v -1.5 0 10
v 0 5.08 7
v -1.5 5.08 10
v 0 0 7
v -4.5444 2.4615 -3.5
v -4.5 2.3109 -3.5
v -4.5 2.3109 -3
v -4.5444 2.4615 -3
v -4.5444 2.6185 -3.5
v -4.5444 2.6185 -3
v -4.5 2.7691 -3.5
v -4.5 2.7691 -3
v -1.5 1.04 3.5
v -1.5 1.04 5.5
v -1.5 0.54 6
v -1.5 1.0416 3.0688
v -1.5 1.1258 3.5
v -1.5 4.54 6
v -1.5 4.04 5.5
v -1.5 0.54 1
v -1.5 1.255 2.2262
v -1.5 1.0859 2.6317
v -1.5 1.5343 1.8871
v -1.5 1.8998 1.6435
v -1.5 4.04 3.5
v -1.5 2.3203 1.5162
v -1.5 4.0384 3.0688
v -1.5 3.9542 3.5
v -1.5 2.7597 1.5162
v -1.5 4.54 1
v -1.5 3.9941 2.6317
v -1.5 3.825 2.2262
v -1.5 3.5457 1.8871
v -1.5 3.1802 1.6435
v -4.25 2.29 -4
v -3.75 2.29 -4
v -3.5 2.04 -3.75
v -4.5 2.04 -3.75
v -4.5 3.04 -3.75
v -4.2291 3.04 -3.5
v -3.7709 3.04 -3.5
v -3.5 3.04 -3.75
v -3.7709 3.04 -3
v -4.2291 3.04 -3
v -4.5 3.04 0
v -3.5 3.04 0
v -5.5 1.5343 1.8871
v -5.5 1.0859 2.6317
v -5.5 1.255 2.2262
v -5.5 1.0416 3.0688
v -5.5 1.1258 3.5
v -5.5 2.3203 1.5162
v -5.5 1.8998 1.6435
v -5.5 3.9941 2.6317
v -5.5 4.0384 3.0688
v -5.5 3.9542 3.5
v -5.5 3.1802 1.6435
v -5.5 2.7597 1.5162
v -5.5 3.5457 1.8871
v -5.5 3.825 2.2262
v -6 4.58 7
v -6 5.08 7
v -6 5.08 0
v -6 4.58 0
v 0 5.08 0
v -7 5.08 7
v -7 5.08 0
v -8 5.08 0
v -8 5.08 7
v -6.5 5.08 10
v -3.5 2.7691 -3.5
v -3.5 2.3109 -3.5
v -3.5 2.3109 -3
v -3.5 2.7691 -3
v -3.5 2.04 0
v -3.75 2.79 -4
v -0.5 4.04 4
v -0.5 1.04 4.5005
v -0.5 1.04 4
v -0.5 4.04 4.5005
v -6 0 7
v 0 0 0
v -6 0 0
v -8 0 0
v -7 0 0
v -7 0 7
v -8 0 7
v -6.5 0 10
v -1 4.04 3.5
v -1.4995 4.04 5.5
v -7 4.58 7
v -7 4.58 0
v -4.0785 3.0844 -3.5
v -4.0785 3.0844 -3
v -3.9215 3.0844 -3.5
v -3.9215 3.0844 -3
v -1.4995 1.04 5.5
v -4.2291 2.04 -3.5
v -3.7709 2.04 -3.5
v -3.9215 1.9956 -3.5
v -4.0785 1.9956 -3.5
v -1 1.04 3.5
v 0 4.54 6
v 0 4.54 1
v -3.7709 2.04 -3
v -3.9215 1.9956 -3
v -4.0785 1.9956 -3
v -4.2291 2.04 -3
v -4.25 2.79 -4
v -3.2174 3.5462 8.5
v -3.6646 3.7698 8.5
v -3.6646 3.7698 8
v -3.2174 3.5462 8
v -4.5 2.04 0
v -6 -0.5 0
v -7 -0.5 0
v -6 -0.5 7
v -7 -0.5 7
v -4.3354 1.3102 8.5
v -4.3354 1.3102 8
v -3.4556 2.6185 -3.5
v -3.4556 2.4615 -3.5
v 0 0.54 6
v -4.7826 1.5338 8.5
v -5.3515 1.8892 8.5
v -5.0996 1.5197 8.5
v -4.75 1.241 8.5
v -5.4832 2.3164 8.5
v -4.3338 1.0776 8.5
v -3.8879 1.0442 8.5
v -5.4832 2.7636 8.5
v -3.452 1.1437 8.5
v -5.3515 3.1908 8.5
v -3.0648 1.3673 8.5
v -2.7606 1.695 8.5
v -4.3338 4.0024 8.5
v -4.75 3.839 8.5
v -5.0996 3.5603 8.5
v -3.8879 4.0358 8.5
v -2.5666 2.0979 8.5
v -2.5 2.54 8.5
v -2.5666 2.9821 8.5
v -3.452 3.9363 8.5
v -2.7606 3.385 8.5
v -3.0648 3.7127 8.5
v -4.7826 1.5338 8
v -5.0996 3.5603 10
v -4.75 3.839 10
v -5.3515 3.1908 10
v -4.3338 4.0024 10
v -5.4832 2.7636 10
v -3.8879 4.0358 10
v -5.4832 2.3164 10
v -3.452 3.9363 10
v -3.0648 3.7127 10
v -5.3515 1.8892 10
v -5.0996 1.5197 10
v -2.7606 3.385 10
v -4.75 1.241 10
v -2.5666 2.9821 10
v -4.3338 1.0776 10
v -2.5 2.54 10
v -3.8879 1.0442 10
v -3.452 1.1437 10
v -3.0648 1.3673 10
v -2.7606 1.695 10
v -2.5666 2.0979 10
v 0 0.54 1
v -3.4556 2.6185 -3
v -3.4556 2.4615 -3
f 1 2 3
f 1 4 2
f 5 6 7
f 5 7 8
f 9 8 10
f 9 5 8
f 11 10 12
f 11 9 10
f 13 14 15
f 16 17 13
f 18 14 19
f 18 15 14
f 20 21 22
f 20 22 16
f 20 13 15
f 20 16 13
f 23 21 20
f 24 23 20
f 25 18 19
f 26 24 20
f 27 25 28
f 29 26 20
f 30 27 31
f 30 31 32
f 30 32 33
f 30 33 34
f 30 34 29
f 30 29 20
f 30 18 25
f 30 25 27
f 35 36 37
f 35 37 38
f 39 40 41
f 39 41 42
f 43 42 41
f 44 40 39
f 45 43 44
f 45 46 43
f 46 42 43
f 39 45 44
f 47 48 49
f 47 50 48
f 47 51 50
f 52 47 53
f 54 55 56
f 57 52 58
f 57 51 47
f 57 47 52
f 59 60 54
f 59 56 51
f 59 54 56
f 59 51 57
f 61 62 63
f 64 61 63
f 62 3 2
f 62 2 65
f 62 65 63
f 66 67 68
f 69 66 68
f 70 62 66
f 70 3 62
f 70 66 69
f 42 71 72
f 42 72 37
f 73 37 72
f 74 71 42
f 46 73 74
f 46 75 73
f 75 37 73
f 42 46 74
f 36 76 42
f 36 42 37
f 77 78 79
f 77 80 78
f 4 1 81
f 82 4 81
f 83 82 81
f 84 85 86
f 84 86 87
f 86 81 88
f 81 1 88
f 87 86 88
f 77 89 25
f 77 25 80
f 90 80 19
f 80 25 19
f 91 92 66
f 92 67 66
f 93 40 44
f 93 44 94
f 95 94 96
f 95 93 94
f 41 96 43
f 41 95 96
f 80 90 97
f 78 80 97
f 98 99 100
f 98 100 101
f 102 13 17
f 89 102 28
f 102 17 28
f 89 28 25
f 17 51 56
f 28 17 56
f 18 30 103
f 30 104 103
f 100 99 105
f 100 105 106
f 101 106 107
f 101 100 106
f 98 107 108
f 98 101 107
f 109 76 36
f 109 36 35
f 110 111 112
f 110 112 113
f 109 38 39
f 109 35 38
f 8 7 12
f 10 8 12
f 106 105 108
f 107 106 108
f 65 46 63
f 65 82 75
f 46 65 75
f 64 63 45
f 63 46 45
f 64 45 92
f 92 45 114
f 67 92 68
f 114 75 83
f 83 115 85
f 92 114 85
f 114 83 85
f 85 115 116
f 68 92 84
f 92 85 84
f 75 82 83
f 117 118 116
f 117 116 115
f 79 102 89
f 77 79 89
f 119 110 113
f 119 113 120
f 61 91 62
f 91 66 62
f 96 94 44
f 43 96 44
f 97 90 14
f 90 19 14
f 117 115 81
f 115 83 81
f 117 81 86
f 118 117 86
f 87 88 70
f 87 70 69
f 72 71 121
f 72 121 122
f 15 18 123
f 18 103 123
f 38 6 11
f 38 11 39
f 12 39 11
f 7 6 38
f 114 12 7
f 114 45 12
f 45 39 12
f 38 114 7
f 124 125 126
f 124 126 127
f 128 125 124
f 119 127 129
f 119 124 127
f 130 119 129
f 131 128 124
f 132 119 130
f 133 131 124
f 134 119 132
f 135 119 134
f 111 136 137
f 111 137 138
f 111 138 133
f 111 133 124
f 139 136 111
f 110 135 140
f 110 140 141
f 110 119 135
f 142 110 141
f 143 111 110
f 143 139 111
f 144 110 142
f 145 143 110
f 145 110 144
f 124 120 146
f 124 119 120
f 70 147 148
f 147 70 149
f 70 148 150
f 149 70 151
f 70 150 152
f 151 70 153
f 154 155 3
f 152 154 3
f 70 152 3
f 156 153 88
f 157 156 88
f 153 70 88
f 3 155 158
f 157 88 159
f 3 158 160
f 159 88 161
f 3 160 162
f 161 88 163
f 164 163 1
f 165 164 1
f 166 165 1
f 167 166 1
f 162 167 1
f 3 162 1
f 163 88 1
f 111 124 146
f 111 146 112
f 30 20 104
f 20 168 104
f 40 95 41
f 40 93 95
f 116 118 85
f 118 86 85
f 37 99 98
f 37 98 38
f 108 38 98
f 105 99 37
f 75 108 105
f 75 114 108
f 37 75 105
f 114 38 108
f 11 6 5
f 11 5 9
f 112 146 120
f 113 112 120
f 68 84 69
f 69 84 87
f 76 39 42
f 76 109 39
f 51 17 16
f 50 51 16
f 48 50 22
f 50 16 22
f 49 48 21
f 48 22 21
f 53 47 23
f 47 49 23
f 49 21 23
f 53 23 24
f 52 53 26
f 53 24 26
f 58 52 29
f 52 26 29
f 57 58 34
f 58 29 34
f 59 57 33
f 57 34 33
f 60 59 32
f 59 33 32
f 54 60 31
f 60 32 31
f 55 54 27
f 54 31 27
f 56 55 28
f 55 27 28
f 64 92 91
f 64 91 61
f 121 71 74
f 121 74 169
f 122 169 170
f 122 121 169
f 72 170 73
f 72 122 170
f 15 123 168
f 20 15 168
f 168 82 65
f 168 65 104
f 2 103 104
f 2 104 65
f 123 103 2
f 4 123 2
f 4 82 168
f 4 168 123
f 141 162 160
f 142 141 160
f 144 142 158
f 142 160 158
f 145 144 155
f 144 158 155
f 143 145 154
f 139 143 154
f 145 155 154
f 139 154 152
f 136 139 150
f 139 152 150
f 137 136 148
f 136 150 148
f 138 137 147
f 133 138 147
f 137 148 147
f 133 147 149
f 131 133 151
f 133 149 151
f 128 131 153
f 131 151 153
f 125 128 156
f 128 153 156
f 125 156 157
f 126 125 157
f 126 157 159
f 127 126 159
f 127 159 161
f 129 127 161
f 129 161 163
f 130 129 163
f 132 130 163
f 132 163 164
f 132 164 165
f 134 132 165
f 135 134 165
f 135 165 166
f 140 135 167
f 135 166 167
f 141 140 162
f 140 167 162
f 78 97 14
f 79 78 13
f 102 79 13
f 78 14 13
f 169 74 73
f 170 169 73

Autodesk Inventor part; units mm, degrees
ref_plane "YZ Plane" through (0, 0, 0) normal (1, 0, 0) x (0, 1, 0)
ref_plane "XZ Plane" through (0, 0, 0) normal (0, 1, 0) x (-1, 0, 0)
sketch "Skizze4" plane through (0, 0, 0) normal (0, 1, 0) x (-1, 0, 0)
  line L0 (0, 0) -> (8, 0)
  line L1 (8, 0) -> (8, 7)
  line L2 (0, 0) -> (0, 7)
  line L3 (6.5, 10) -> (1.5, 10)
  line L4 (0, 7) -> (1.5, 10)
  line L5 (6.5, 10) -> (8, 7)
  dimension "d4" = 8
  dimension "d5" = 5
  dimension "d6" = 10
  dimension "d7" = 1.5
extrude "Extrusion2" add sketch "Skizze4" along normal blind 5.08
sketch "Skizze5" plane through (0, 0, 0) normal (0, -1, 0) x (1, 0, 0)
  line L0 (-7, 0) -> (-6, 0)
  line L1 (-6, 0) -> (-6, 7)
  line L2 (-6, 7) -> (-7, 7)
  line L3 (-7, 7) -> (-7, 0)
  line L4 (0, 0) -> (-8, 0) projected
  line L5 (-8, 0) -> (-8, 7) projected
  dimension "d10" = 7
  dimension "d11" = 1
  dimension "d12" = 1
extrude "Extrusion3" add sketch "Skizze5" along normal blind 0.5
sketch "Skizze6" plane through (0, 5.08, 0) normal (0, 1, 0) x (1, 0, 0)
  line L0 (-7, 0) -> (-7, -7) projected
  line L1 (-7, 0) -> (-6, 0) projected
  line L2 (-6, -7) -> (-6, 0) projected
  line L3 (-7, -7) -> (-6, -7) projected
  line L4 (-6, -7) -> (-7, -7)
  line L5 (-7, -7) -> (-7, 0)
  line L6 (-7, 0) -> (-6, 0)
  line L7 (-6, 0) -> (-6, -7)
  point P0 (0, 0)
extrude "Extrusion4" cut sketch "Skizze6" against normal blind 0.5
sketch "Skizze7" plane through (0, 0, 7) normal (1, 0, 0) x (0, 0, -1)
  line L0 (1, 0.54) -> (6, 0.54)
  line L1 (6, 0.54) -> (6, 4.54)
  line L2 (6, 4.54) -> (1, 4.54)
  line L3 (1, 4.54) -> (1, 0.54)
  line L4 (0, 0) -> (7, 0) projected
  line L5 (7, 0) -> (7, 5.08) projected
  dimension "d17" = 5
  dimension "d18" = 4
  dimension "d19" = 0.54
  dimension "d20" = 1
extrude "Extrusion5" cut sketch "Skizze7" against normal blind 1.5
sketch "Skizze8" plane through (-1.5, 0, 7) normal (1, 0, 0) x (0, 0, -1)
  circle A0 centre (4, 2.54) radius 1.5
  line L0 (1, 4.54) -> (6, 4.54) projected
  line L1 (6, 4.54) -> (6, 0.54) projected
  point P0 (7, 0)
  dimension "d23" = 3
  dimension "d24" = 2
  dimension "d25" = 2
extrude "Extrusion6" cut sketch "Skizze8" against normal blind 4
sketch "Skizze10" plane through (-5.5, 2.54, 3) normal (1, 0, 0) x (0, 0, -1)
  line L0 (-2.5, -1.5) -> (-0.5, -1.5)
  line L1 (-0.5, -1.5) -> (-0.5, 1.5)
  line L2 (-0.5, 1.5) -> (-2.5, 1.5)
  line L3 (-2.5, 1.5) -> (-2.5, -1.5)
  line L4 (2, 2) -> (2, -2) projected
  line L5 (-3, 2) -> (2, 2) projected
  point P0 (3, -2.54)
  dimension "d28" = 2
  dimension "d34" = 2.5
  dimension "d41" = 0.5
  dimension "d42" = 3
extrude "Extrusion7" add sketch "Skizze10" along normal blind 5
chamfer "Fase2" distance 0.5 angle 45 1 edges at (-0.5, 2.54, 3.5)
chamfer "Fase3" distance 1 angle 45 1 edges at (-0.5, 2.54, 5.5)
sketch "Skizze11" plane through (-6.5, 0, 10) normal (0, 0, 1) x (1, 0, 0)
  circle A0 centre (2.5, 2.54) radius 1.5
  line L0 (0, 5.08) -> (5, 5.08) projected
  line L1 (6.5, 0) -> (6.5, 5.08) projected
  line L2 (0, 0) -> (5, 0) projected
  dimension "d43" = 3
  dimension "d45" = 4
  dimension "d54" = 2.54
extrude "Extrusion8" cut sketch "Skizze11" against normal blind 1.5
sketch "Skizze12" plane through (-4, 2.54, 8.5) normal (0, 0, 1) x (1, 0, 0)
  line L0 (0.7826, 1.0062) -> (-0.3354, -1.2298)
  line L1 (-0.3354, -1.2298) -> (-0.7826, -1.0062)
  line L2 (-0.7826, -1.0062) -> (0.3354, 1.2298)
  line L3 (0.3354, 1.2298) -> (0.7826, 1.0062)
  line L4 (-0.3354, -1.2298) -> (0.3354, 1.2298) construction
  line L5 (-0.7826, -1.0062) -> (0.7826, 1.0062) construction
  line L6 (-2.5, 2.54) -> (2.5, 2.54) projected
  line L7 (4, -2.54) -> (4, 2.54) projected
  line L8 (-2.5, -2.54) -> (2.5, -2.54) projected
  point P0 (0, 0)
  point P1 (0, 0)
  point P2 (0, 0)
  dimension "d48" = 2.5
  dimension "d49" = 0.5
  dimension "d51" = 4
  dimension "d55" = 2.54
extrude "Extrusion9" cut sketch "Skizze12" against normal blind 0.5
sketch "Skizze14" plane through (0, 0, 0) normal (0, 0, -1) x (-1, 0, 0)
  line L0 (4.5, 2.04) -> (3.5, 2.04)
  line L1 (3.5, 2.04) -> (3.5, 3.04)
  line L2 (3.5, 3.04) -> (4.5, 3.04)
  line L3 (4.5, 3.04) -> (4.5, 2.04)
  line L4 (0, 0) -> (6, 0) projected
  line L5 (0, 0) -> (0, 5.08) projected
  dimension "d56" = 1
  dimension "d57" = 1
  dimension "d58" = 2.04
  dimension "d59" = 3.5
extrude "Extrusion10" add sketch "Skizze14" along normal blind 4
chamfer "Fase4" distance 0.25 angle 45 4 edges at (-3.5, 2.54, -4) (-4, 2.04, -4) (-4.5, 2.54, -4) (-4, 3.04, -4)
ref_plane "Arbeitsebene1" through (0, 0, -3.5) normal (0, 0, -1) x (-1, 0, 0)
sketch "Skizze15" plane through (0, 0, -3.5) normal (0, 0, -1) x (-1, 0, 0)
  circle A0 centre (4, 2.54) radius 0.55
  line L0 (3.5, 3.04) -> (3.5, 2.04) projected
  line L1 (3.5, 3.04) -> (4.5, 3.04) projected
  point P0 (0, 0)
  dimension "d66" = 1.1
  dimension "d67" = 0.5
  dimension "d68" = 0.5
extrude "Extrusion11" add sketch "Skizze15" against normal blind 0.5 contours A0 L0 L1 | L1 A0 | A0 L0 picked at (4.1108, 2.456)
properties part number "Schraubklemme_Blau_300V_16A"
